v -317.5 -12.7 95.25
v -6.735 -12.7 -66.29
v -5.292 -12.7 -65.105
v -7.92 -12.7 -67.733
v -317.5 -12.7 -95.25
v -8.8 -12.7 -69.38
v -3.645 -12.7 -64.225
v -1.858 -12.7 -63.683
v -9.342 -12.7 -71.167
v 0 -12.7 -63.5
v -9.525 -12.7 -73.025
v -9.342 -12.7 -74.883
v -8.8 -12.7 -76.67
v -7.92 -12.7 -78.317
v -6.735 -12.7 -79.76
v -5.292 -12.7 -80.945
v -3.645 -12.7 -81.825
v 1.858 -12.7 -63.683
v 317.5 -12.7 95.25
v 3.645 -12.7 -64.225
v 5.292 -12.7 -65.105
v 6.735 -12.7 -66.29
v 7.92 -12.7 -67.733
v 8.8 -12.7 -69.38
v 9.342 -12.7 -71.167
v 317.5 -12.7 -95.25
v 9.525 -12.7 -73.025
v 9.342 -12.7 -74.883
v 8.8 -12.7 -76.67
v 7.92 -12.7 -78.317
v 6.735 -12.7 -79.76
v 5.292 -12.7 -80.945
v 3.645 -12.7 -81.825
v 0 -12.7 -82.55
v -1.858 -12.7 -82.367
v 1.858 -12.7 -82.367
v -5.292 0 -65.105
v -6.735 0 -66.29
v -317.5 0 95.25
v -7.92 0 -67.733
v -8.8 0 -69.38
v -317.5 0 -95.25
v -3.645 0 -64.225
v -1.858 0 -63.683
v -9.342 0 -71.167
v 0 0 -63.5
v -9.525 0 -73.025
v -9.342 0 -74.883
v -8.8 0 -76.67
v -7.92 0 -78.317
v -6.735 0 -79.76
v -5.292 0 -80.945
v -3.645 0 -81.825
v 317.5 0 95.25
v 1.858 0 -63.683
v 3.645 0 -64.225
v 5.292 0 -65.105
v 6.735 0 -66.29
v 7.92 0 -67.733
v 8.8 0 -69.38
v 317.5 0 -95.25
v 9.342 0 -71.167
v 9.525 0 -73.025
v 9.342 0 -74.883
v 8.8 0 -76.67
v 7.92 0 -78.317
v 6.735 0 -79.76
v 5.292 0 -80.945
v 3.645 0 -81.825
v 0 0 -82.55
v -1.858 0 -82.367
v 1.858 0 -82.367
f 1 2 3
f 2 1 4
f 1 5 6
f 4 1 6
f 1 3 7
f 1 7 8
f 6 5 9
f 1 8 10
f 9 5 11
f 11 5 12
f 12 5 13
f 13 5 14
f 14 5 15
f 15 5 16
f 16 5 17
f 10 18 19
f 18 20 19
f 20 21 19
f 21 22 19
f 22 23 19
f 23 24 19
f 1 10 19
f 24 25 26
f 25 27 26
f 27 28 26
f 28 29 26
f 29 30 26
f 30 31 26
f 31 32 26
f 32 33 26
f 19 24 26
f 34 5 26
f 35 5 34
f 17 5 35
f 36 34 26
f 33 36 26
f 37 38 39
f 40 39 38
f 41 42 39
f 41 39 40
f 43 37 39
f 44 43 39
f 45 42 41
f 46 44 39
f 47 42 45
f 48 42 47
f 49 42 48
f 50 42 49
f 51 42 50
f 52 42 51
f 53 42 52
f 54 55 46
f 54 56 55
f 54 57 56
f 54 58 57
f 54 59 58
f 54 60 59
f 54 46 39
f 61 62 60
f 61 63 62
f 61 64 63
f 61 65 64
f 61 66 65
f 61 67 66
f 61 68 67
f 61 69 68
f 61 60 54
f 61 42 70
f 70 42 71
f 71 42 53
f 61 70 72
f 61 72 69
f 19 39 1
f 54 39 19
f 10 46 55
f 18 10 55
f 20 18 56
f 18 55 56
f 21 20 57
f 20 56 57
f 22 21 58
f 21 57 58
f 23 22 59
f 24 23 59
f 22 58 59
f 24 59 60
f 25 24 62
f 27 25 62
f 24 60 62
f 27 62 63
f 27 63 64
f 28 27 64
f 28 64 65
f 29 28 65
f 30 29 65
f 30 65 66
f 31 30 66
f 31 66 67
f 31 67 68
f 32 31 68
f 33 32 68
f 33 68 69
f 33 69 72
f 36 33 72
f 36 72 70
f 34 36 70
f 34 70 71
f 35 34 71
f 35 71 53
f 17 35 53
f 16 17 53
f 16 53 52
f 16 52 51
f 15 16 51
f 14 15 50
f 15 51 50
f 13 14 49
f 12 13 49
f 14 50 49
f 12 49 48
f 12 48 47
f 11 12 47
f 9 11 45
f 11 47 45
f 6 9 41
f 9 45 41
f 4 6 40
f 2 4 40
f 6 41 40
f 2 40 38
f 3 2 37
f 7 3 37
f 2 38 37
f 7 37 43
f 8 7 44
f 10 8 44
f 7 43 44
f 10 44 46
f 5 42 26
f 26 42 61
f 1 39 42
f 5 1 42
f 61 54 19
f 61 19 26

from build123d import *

# Parameters (mm, degrees)
SKETCH1_W           = 635
SKETCH1_H           = 190.5
BOSS_EXTRUDE1_DEPTH = 12.7
SKETCH2_R           = 9.525
CUT_EXTRUDE1_DEPTH  = 332.72293032


with BuildPart() as part:
    # Sketch1 → Boss-Extrude1 (new body)
    with BuildSketch(Plane(origin=(0, 0, 0), x_dir=(1, 0, 0), z_dir=(0, 1, 0))):
        Rectangle(SKETCH1_W, SKETCH1_H)
    extrude(amount=-BOSS_EXTRUDE1_DEPTH)

    # Sketch2 → Cut-Extrude1 (cut, through all)
    with BuildSketch(Plane(origin=(0, 0, 0), x_dir=(1, 0, 0), z_dir=(0, 1, 0))):
        with Locations(Location((0, 73.025, 0), (0, 0, 270))):
            Circle(SKETCH2_R)
    extrude(amount=-CUT_EXTRUDE1_DEPTH, mode=Mode.SUBTRACT)


solid = part.part
